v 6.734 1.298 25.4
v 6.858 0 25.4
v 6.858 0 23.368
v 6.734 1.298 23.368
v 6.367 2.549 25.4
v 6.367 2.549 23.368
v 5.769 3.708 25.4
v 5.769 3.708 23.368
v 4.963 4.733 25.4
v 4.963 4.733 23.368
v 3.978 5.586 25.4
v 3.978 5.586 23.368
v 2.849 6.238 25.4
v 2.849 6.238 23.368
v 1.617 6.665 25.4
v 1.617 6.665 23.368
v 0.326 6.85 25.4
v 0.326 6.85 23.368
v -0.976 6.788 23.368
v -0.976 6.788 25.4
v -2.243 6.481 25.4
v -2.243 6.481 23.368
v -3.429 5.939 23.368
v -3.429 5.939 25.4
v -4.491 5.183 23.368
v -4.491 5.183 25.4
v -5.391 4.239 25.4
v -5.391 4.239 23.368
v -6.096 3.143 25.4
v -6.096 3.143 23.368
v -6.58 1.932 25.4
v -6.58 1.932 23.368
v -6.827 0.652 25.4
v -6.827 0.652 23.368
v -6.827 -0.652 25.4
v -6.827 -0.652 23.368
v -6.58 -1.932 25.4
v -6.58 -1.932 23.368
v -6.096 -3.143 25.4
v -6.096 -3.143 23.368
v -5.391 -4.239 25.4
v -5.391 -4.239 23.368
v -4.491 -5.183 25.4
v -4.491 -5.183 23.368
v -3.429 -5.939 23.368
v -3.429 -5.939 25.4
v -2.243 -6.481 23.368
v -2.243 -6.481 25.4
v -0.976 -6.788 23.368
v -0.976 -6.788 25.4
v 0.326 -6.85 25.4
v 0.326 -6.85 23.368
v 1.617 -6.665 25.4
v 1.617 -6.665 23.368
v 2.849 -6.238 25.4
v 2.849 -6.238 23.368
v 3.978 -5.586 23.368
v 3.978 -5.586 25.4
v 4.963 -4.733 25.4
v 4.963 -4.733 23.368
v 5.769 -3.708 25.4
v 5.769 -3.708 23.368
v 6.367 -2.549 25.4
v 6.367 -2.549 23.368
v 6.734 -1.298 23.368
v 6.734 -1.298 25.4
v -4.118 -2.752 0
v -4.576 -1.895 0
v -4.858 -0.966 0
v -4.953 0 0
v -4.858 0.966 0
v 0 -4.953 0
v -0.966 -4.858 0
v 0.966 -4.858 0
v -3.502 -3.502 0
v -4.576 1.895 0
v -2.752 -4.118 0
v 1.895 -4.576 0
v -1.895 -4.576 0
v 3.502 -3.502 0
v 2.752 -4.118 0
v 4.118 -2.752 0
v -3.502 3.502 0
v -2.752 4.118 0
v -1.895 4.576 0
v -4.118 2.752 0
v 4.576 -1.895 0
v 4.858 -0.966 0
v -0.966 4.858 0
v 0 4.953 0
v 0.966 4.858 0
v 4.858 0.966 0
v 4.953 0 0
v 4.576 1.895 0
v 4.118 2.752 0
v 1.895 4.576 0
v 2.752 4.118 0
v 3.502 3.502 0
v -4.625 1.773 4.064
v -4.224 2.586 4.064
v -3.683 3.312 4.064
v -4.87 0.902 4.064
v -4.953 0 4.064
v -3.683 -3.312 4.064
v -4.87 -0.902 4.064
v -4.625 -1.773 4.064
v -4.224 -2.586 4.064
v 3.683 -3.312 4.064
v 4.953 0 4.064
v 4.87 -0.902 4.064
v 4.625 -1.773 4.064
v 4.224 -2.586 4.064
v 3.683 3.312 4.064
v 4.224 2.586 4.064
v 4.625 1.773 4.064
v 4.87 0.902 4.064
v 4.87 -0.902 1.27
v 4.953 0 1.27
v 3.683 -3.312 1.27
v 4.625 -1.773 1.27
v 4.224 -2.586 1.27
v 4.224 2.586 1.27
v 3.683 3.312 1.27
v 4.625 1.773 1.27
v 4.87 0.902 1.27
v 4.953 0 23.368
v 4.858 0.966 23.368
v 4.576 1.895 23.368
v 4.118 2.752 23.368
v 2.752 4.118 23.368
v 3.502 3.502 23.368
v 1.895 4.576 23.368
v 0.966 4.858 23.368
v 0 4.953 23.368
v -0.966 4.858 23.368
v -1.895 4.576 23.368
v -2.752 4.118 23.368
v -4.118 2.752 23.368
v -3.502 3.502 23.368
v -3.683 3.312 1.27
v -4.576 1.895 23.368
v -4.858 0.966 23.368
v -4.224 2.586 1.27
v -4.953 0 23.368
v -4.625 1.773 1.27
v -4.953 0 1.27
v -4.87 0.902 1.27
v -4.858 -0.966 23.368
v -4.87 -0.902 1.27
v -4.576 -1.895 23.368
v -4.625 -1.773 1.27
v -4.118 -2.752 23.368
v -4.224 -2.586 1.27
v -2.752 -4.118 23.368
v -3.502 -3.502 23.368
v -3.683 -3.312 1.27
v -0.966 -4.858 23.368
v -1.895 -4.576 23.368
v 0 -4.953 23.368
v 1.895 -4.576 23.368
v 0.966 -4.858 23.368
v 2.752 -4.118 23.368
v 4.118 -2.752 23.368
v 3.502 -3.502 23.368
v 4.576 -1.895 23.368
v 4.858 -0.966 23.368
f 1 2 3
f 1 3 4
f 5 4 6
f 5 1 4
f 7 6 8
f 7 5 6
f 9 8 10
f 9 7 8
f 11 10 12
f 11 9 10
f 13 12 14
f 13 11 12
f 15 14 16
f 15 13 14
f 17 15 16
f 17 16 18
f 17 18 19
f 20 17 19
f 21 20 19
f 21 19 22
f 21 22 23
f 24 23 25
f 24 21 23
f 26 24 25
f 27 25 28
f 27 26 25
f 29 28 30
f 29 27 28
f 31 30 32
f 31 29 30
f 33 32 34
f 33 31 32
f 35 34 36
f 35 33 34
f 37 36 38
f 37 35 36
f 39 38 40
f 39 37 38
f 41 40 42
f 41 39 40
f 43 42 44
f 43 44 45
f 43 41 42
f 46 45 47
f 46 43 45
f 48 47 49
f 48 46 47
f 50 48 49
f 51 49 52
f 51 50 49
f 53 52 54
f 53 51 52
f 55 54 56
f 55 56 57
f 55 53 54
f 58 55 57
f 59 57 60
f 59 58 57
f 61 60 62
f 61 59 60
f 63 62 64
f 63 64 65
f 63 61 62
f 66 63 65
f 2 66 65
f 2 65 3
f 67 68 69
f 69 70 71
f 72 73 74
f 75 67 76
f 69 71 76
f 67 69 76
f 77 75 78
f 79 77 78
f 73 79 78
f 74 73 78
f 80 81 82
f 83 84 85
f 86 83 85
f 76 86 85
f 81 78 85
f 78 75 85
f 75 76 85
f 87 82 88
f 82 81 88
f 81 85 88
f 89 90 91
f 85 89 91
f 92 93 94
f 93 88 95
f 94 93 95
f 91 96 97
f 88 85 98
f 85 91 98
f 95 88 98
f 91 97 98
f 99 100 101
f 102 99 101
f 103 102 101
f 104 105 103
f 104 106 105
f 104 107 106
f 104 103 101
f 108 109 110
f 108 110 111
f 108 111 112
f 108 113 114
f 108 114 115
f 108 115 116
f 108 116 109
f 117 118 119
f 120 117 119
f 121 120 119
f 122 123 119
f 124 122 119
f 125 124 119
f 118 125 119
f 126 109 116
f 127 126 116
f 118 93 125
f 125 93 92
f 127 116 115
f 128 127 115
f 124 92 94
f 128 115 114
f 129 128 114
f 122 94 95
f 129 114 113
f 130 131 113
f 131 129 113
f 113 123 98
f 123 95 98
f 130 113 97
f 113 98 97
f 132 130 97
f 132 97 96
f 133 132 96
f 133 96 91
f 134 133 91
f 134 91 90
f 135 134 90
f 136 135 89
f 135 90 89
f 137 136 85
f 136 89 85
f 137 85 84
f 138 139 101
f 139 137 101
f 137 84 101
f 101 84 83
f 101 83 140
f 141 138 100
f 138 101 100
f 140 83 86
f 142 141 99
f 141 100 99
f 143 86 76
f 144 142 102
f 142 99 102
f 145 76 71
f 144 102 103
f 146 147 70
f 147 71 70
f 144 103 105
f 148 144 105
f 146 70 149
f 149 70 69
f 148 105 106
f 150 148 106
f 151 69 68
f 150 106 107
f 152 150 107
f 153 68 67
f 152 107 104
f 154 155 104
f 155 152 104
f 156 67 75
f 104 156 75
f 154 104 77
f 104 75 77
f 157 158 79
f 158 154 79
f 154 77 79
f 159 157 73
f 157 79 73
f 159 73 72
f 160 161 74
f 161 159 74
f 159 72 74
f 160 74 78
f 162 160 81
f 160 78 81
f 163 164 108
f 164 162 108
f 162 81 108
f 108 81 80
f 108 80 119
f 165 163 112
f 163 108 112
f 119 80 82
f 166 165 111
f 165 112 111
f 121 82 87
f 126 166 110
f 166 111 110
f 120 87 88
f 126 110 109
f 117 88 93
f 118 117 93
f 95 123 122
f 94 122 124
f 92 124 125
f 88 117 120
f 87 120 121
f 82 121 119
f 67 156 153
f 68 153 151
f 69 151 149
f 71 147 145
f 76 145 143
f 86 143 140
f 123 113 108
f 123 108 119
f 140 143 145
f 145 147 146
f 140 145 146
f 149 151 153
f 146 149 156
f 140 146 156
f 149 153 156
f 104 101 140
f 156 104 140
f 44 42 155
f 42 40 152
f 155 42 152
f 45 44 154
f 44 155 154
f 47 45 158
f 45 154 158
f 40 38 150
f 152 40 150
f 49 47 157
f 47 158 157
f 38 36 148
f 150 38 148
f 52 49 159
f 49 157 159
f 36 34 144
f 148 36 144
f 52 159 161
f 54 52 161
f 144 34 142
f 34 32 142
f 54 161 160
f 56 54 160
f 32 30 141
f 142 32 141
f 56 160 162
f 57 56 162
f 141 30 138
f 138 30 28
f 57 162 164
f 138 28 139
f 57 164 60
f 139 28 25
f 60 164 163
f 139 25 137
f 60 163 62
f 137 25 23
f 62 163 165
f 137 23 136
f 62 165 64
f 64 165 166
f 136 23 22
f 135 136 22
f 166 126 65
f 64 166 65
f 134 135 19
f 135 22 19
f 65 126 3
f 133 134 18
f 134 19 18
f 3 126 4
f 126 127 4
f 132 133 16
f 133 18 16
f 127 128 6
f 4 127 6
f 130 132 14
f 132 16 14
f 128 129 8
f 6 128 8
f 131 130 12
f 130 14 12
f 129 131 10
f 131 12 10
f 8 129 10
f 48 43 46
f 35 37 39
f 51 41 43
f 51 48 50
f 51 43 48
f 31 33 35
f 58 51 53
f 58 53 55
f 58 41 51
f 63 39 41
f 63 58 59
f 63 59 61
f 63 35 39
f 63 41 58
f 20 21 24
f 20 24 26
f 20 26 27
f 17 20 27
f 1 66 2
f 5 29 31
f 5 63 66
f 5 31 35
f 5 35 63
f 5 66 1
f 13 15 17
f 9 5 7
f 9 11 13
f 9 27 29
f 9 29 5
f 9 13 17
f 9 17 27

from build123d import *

# Parameters (mm, degrees)
SKETCH1_R               = 4.953
BOSS_EXTRUDE1_DEPTH     = 25.4
SKETCH2_R               = 6.858
BOSS_EXTRUDE2_DEPTH     = 2.032
CUT_EXTRUDE1_DEPTH      = 28.188680145
CUT_EXTRUDE1_DEPTH_BACK = 28.188680145
SKETCH3_W               = 1.27
SKETCH3_H               = 2.794


with BuildPart() as part:
    # Sketch1 → Boss-Extrude1 (new body)
    with BuildSketch(Plane.XY):
        Circle(SKETCH1_R)
    extrude(amount=BOSS_EXTRUDE1_DEPTH)

    # Sketch2 → Boss-Extrude2 (add)
    with BuildSketch(Plane.XY.offset(25.4)):
        Circle(SKETCH2_R)
    extrude(amount=-BOSS_EXTRUDE2_DEPTH)

    # Sketch3 → Cut-Extrude1 (cut, two sides: drawn at the far end of the back side and taken through both)
    with BuildSketch(Plane(origin=(0, 0, 0), x_dir=(1, 0, 0), z_dir=(0, 1, 0)).offset(-CUT_EXTRUDE1_DEPTH_BACK)):
        with Locations((4.318, -2.667)):
            Rectangle(SKETCH3_W, SKETCH3_H)
        with Locations((-4.318, -2.667)):
            Rectangle(SKETCH3_W, SKETCH3_H)
    extrude(amount=CUT_EXTRUDE1_DEPTH + CUT_EXTRUDE1_DEPTH_BACK, mode=Mode.SUBTRACT)


solid = part.part
